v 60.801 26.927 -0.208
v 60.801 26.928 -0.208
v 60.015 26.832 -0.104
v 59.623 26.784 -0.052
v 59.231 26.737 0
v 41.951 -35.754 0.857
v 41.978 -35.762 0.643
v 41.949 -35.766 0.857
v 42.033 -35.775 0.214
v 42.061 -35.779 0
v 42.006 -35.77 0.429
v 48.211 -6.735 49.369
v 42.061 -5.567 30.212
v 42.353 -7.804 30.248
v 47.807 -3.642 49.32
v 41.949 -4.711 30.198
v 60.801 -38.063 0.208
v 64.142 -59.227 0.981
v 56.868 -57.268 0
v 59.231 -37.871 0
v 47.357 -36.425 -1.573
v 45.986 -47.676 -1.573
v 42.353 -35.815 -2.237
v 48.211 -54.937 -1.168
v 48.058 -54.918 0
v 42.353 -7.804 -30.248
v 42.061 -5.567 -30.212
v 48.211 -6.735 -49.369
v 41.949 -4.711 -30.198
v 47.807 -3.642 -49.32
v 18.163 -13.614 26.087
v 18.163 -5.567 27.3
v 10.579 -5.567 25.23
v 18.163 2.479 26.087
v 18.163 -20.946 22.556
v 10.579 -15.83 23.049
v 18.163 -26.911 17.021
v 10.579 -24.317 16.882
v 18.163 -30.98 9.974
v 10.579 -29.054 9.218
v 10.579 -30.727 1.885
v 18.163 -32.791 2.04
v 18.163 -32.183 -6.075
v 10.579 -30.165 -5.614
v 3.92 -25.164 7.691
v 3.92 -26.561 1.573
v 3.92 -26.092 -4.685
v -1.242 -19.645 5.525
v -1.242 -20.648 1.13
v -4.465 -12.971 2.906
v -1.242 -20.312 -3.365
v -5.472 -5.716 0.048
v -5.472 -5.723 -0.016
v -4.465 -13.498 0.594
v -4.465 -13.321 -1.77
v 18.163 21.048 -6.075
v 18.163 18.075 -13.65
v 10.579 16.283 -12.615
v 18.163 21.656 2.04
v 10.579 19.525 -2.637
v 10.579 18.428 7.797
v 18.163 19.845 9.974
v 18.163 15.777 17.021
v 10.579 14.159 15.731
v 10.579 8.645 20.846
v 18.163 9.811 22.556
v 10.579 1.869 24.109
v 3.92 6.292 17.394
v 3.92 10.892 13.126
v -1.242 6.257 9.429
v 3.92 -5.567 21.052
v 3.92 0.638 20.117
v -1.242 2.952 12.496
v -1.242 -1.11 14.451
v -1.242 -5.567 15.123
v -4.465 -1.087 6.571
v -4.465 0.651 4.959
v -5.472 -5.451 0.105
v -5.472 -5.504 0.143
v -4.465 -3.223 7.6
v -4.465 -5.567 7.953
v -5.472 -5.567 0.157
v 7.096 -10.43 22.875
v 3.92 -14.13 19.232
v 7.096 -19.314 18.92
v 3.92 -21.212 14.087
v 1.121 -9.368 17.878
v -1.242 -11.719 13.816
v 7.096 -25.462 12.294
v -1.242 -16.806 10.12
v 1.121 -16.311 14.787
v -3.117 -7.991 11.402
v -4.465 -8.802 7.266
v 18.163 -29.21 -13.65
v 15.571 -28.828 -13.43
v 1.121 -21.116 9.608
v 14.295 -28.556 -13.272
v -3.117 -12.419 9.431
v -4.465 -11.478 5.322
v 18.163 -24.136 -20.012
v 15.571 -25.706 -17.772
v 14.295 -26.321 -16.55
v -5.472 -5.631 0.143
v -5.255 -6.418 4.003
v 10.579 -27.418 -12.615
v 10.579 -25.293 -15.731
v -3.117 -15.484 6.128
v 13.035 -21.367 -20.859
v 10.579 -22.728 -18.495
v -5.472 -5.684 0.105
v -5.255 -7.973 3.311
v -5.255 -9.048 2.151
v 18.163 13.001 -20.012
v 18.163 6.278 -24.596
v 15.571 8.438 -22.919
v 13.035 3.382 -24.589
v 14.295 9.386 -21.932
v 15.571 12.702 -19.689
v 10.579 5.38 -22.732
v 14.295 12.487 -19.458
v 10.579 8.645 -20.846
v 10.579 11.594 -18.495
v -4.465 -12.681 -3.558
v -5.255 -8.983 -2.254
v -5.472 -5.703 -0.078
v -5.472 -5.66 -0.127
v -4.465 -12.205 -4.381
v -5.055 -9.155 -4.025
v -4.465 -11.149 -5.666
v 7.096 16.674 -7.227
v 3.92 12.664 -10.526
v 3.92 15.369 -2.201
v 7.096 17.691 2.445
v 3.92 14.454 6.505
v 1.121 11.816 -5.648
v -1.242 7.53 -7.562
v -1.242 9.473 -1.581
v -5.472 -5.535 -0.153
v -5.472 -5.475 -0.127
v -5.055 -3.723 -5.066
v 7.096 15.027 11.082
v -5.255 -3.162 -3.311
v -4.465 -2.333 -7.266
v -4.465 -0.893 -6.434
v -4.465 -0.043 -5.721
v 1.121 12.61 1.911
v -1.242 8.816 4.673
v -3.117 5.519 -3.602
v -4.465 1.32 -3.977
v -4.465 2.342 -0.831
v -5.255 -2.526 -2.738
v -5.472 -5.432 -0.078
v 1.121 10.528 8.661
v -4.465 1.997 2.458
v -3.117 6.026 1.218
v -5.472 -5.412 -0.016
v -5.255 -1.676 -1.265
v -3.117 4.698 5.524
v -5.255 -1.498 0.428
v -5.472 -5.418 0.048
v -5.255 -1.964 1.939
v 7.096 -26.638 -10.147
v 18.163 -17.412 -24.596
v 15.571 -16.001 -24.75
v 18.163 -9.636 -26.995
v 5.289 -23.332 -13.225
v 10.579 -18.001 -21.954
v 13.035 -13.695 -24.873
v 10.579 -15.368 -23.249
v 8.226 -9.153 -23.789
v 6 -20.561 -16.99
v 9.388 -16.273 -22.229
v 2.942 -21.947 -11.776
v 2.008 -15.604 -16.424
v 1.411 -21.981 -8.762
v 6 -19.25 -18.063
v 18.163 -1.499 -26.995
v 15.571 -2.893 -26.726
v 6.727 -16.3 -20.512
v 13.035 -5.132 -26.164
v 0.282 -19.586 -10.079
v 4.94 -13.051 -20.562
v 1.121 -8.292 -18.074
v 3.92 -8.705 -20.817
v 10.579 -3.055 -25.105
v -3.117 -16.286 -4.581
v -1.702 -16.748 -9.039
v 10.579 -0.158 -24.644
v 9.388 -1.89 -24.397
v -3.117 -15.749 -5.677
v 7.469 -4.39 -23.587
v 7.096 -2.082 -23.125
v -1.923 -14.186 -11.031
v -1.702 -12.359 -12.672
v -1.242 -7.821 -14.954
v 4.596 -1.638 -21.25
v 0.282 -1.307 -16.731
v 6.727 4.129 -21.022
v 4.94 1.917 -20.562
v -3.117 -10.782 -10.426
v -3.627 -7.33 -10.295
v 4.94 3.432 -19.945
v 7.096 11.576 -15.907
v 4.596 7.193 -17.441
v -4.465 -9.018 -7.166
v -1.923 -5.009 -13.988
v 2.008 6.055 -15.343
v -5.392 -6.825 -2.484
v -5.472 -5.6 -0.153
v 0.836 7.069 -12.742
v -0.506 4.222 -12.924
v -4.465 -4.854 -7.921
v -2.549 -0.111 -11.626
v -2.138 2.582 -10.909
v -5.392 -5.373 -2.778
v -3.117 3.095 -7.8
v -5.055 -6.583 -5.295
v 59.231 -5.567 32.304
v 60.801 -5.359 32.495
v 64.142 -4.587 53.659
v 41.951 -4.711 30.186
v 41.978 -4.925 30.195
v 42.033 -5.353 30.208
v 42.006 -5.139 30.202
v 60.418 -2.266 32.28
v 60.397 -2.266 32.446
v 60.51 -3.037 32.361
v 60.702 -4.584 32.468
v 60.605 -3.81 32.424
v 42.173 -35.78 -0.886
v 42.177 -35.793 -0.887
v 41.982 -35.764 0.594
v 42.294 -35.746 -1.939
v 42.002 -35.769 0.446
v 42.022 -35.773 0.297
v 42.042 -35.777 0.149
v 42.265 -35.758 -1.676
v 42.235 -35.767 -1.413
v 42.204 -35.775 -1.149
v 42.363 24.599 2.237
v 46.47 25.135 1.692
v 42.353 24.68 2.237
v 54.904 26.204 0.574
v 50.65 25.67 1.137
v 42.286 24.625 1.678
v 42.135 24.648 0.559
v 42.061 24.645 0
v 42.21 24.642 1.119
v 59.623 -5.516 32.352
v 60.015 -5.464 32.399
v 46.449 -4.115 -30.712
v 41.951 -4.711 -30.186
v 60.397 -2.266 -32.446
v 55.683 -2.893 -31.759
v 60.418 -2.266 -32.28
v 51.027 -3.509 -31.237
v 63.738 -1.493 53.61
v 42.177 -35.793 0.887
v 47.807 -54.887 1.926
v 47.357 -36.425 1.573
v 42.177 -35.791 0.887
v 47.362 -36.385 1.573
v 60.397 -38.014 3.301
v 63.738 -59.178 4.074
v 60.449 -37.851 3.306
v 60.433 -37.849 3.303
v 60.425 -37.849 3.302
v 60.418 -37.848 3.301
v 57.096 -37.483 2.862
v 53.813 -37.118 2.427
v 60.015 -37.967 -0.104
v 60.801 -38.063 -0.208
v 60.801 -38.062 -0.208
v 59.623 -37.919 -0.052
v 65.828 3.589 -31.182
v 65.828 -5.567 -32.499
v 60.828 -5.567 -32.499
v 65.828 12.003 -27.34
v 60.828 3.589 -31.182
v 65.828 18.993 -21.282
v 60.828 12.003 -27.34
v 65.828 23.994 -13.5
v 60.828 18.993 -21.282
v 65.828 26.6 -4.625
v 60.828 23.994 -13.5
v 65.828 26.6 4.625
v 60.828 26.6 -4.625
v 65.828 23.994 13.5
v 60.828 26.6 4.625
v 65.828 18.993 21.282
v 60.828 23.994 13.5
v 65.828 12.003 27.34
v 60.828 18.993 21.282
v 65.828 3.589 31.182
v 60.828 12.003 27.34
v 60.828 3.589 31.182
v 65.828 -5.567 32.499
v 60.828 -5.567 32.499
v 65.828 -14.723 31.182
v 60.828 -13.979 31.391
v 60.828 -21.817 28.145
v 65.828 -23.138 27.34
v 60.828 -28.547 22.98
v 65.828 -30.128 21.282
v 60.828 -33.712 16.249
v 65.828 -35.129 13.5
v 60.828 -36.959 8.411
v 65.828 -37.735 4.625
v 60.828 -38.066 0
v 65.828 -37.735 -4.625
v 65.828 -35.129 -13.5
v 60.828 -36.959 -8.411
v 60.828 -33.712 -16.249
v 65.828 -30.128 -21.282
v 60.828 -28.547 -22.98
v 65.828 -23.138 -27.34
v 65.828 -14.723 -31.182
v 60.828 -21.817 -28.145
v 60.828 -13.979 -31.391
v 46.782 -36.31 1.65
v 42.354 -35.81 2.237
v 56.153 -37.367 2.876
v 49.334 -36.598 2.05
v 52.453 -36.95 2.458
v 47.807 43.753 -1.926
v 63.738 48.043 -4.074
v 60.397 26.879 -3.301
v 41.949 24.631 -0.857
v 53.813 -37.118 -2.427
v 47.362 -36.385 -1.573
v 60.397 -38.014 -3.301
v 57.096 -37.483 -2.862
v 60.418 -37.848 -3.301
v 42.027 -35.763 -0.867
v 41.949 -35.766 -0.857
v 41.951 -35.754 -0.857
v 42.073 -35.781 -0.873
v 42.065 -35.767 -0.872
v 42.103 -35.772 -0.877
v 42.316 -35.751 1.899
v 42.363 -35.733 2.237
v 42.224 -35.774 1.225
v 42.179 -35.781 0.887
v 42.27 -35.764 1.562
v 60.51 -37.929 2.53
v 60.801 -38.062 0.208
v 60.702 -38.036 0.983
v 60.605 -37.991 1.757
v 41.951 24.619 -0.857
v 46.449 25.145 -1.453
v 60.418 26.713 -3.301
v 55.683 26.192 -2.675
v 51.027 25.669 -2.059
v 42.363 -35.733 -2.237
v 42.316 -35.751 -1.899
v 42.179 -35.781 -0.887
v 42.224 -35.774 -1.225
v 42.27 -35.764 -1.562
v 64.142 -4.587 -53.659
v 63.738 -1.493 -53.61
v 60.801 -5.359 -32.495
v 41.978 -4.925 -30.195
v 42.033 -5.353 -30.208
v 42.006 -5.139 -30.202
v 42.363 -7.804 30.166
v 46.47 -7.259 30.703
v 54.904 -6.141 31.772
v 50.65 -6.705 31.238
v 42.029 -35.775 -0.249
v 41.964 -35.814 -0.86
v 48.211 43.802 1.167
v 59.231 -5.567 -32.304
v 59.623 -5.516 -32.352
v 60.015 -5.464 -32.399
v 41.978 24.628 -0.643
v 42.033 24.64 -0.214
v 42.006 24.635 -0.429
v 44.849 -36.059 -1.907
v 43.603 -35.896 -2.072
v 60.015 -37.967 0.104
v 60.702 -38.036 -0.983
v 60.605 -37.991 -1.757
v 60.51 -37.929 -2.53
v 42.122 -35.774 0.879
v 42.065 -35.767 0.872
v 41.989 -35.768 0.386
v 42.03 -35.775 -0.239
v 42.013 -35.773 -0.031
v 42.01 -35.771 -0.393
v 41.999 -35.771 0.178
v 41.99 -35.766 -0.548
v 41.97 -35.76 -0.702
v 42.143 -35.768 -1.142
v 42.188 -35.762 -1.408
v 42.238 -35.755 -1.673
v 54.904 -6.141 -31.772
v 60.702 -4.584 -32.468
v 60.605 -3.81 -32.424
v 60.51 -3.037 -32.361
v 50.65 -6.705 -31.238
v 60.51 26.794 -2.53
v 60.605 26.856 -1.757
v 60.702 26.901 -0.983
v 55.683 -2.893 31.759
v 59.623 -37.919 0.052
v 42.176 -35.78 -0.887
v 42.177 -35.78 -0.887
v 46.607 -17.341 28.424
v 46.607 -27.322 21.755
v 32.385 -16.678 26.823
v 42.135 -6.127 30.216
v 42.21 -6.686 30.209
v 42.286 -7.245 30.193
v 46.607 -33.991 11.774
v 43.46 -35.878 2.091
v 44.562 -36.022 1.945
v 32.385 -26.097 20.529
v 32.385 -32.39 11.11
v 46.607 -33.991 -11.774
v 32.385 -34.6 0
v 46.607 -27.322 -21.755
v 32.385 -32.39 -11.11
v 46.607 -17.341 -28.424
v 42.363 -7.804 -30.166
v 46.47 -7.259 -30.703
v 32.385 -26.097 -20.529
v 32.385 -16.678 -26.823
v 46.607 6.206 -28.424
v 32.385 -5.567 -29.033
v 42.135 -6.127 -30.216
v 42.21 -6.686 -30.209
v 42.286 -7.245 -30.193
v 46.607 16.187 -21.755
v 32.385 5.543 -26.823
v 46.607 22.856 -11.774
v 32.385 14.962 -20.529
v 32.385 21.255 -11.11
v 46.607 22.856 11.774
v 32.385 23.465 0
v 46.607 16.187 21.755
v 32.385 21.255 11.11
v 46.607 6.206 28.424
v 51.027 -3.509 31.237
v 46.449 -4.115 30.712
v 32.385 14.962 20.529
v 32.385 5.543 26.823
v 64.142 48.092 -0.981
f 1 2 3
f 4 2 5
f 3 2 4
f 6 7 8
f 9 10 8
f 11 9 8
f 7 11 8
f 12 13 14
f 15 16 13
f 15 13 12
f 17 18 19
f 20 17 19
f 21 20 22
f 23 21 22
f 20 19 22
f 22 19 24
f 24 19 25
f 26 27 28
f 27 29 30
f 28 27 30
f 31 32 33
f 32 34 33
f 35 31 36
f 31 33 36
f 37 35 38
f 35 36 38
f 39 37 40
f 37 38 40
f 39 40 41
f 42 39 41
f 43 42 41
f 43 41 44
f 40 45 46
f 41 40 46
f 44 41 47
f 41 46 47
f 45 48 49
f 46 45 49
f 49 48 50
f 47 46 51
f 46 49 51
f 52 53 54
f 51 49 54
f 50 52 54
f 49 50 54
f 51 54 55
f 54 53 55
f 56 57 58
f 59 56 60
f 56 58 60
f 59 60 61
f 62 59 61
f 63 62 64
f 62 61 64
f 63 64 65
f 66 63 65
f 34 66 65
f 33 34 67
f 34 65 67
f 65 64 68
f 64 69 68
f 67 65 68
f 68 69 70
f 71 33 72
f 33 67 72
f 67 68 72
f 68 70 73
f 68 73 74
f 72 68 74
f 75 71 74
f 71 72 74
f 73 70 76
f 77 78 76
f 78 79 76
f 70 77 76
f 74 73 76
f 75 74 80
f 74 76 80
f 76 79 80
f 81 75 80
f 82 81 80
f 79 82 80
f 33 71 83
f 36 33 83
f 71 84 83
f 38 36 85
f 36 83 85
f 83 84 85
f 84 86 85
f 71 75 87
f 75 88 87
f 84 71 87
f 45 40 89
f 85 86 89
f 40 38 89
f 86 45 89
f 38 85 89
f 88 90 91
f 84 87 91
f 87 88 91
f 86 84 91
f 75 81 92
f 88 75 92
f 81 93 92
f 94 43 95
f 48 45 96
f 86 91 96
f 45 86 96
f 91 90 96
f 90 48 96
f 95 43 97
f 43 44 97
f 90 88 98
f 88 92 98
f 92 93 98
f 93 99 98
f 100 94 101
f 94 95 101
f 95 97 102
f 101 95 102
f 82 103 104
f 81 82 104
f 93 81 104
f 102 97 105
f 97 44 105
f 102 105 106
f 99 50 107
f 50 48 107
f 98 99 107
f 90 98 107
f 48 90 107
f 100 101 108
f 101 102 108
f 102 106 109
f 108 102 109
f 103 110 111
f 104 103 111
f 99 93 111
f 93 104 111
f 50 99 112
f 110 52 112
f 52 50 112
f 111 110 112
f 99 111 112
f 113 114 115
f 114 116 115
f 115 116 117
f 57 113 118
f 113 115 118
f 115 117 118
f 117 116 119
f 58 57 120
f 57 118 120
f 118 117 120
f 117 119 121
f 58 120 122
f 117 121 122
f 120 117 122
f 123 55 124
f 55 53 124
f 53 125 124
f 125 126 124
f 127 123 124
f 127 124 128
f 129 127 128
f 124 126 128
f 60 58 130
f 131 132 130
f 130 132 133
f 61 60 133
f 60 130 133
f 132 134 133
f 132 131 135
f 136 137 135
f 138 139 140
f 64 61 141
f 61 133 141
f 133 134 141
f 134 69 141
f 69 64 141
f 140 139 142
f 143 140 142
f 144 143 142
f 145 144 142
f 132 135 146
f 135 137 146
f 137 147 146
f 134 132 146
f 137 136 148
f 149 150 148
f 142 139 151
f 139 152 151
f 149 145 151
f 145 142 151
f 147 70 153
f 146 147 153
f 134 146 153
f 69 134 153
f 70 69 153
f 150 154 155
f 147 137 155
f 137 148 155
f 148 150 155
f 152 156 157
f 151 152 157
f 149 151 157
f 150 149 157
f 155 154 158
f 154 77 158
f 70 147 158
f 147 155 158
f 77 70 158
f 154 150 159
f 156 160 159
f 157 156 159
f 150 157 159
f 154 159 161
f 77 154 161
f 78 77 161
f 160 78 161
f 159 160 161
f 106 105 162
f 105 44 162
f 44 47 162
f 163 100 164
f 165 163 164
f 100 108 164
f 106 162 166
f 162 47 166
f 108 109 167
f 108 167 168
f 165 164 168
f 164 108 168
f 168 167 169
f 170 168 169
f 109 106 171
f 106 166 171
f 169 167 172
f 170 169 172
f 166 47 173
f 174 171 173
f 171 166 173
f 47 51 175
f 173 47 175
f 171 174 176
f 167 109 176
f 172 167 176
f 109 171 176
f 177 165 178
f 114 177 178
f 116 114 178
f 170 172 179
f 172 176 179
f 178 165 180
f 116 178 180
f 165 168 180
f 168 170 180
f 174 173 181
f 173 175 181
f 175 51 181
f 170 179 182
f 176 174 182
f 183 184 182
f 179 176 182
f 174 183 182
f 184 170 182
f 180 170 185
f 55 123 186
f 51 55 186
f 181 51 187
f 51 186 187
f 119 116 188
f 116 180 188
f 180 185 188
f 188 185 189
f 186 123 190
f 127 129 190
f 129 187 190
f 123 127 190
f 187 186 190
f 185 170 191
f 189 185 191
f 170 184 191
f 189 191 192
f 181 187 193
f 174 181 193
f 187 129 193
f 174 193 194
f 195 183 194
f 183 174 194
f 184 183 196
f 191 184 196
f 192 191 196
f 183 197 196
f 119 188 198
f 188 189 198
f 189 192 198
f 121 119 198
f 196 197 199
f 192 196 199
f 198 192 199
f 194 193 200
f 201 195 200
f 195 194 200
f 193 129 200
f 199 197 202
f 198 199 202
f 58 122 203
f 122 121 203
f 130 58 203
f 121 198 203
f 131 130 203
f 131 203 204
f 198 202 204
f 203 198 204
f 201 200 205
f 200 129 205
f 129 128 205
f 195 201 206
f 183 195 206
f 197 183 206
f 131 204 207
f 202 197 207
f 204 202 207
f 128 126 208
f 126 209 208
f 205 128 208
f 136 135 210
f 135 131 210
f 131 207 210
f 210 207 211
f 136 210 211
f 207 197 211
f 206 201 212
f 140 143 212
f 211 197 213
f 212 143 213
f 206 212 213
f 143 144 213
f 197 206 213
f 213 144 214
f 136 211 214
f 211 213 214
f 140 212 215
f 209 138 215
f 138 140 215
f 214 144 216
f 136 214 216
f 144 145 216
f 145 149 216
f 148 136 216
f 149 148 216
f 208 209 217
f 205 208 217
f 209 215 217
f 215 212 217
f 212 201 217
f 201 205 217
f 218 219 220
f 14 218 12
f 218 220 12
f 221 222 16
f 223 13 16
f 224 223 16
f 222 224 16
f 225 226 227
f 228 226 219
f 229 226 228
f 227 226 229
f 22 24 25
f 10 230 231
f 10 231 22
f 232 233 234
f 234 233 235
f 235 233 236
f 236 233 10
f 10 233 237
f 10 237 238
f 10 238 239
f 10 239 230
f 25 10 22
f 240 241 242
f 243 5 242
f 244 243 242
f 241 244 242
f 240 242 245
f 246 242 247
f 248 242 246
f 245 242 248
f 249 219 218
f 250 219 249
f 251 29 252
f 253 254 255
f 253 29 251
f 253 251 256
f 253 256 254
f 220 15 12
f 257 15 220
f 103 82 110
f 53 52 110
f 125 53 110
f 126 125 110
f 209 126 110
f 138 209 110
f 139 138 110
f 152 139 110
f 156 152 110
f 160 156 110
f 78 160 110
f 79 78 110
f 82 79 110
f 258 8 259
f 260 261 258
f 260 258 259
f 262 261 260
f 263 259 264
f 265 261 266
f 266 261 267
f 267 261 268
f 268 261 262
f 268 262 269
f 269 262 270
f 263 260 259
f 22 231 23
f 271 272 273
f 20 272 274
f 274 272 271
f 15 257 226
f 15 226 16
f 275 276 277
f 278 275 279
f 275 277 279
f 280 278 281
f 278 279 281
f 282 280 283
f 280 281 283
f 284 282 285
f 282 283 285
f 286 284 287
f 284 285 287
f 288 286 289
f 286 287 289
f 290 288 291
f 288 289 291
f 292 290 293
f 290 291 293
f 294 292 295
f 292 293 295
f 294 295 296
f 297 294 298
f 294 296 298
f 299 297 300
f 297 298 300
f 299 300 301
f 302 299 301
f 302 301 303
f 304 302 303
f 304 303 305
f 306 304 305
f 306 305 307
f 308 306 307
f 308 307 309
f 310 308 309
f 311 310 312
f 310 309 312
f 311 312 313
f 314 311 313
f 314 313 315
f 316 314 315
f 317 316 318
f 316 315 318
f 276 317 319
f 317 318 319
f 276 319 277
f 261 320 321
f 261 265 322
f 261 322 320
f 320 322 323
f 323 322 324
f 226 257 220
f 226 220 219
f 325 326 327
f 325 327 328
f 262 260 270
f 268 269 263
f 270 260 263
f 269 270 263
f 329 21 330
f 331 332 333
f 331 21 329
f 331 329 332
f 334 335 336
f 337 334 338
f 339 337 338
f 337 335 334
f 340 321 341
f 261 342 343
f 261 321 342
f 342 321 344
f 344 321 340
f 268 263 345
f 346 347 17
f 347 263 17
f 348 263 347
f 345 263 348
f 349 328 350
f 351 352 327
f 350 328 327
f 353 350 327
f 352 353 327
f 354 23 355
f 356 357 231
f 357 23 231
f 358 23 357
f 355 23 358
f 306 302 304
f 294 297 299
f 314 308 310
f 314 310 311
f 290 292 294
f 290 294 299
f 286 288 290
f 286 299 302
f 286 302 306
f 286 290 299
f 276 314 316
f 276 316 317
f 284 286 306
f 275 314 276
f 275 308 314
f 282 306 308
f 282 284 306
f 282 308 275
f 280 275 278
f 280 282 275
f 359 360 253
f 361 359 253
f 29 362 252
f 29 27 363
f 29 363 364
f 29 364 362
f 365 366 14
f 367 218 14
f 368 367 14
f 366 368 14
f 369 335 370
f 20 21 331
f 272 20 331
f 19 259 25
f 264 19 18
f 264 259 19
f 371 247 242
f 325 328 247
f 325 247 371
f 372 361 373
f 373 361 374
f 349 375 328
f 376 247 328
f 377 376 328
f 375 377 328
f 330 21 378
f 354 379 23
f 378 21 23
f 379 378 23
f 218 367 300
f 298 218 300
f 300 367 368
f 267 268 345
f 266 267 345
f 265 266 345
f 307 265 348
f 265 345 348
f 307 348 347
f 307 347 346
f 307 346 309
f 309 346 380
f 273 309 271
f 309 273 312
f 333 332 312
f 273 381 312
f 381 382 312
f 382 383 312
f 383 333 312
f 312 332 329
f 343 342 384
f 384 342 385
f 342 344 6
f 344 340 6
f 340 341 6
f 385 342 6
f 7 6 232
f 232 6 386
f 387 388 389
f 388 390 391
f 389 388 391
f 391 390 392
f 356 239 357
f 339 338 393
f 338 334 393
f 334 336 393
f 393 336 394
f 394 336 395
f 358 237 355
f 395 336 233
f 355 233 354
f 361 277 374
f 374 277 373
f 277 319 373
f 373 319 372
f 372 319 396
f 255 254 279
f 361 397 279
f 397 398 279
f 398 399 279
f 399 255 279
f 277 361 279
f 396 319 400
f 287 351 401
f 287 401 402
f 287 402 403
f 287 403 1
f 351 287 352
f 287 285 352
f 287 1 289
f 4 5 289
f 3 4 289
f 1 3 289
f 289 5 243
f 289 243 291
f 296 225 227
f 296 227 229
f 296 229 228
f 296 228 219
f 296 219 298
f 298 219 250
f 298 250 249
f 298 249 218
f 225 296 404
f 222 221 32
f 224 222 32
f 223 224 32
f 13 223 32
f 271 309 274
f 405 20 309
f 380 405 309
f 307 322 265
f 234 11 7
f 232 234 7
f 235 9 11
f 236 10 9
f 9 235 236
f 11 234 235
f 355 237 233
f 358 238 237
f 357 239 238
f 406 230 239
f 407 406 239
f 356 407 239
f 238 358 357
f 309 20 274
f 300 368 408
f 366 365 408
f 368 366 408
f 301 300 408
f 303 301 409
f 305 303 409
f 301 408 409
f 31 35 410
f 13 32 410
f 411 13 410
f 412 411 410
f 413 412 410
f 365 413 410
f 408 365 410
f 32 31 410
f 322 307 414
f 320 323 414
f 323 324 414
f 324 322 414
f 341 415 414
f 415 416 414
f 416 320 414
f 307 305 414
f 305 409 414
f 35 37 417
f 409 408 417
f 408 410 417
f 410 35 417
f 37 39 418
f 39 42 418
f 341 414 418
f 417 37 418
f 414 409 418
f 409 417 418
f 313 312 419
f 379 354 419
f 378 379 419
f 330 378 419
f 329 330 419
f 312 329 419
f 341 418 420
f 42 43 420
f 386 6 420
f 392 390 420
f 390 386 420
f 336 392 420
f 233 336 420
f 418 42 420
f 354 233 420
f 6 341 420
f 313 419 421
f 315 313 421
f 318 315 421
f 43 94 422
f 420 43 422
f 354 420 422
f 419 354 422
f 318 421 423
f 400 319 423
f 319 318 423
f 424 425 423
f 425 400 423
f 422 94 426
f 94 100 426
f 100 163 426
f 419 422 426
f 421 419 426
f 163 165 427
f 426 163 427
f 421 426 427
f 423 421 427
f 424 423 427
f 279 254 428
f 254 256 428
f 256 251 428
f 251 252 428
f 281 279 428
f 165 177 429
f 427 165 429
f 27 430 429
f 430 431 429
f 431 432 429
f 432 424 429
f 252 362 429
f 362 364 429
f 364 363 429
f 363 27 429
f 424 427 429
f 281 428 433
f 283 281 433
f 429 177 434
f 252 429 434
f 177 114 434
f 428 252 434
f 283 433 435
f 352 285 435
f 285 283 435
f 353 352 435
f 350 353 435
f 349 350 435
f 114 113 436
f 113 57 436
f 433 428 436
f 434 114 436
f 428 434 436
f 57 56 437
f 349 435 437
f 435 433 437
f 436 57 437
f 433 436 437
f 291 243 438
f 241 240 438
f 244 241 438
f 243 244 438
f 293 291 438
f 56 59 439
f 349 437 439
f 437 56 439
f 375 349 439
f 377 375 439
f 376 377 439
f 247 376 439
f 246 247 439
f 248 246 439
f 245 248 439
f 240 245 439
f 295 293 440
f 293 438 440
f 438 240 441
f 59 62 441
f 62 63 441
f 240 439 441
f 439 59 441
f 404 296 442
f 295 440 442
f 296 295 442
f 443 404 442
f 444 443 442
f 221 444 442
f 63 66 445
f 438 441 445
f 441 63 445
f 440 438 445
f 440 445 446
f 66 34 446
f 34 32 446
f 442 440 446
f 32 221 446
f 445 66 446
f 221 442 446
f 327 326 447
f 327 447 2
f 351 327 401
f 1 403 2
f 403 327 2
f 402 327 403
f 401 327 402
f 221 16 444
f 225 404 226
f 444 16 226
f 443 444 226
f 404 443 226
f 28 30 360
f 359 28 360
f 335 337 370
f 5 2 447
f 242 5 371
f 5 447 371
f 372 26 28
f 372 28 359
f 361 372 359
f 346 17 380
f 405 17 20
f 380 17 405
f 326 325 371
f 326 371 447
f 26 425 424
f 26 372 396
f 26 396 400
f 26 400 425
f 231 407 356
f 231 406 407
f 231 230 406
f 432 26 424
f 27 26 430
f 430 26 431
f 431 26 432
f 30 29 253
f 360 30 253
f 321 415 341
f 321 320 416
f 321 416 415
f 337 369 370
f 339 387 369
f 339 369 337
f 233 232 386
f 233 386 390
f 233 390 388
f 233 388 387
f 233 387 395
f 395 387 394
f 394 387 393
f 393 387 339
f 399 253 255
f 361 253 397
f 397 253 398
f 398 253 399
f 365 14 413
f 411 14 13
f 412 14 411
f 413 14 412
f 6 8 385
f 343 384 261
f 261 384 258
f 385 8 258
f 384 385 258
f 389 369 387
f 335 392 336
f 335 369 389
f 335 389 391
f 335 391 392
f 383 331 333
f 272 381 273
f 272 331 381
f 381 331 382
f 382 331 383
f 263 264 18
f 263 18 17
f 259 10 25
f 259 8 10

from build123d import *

# Parameters (mm, degrees)
BOSS_EXTRUDE1_DEPTH  = 4
BOSS_EXTRUDE5_DEPTH  = 0.5
CIRPATTERN27_COUNT   = 2
CIRPATTERN28_COUNT   = 2
CIRPATTERN28_ANGLE   = 270
MIRROR5_COPY_1_DEPTH = 4
MIRROR5_COPY_2_DEPTH = 0.5
CUT_EXTRUDE1_DEPTH   = 7.5
CUT_EXTRUDE5_DEPTH   = 7.5
CUT_EXTRUDE8_DEPTH   = 7.5
CUT_EXTRUDE9_DEPTH   = 7.5
SCALE1_SCALE         = 0.78
SKETCH35_R           = 32.4987
BOSS_EXTRUDE6_DEPTH  = 5


with BuildPart() as part:
    # Sketch1 → Revolve1 (revolve)
    with BuildSketch(Plane.XY, mode=Mode.PRIVATE) as revolve1_sk:
        with BuildLine():
            Line((68.355271076, -5.571052632), (68.355271076, 36.093947368))
            Line((68.355271076, 36.093947368), (13.656115926, 29.428947368))
            ThreePointArc((13.656115926, 29.428947368), (-8.192658078, 17.861941693), (-16.644728924, -5.370084567))
            Line((-16.644728924, -5.370084567), (-16.644728924, -5.571052632))
            Line((-16.644728924, -5.571052632), (68.355271076, -5.571052632))
        make_face()
    revolve(revolve1_sk.sketch.rotate(Axis((-16.644728924, -5.571052632, 0), (1, 0, 0)), 90), axis=Axis((-16.644728924, -5.571052632, 0), (1, 0, 0)))



with BuildPart() as body_2:
    # Sketch3 → Boss-Extrude1 (new body)
    with BuildSketch(Plane(origin=(0.689359663, -0.083997315, -5.279598975), x_dir=(0.984180627017453, -0.11992075309071235, 0.13041283058690828), z_dir=(0.12945535873547723, -0.01577391759705046, -0.9914597791228399))):
        Polygon((48.907006258, 38.621427836), (59.41626027, 62.048150042), (80.536298945, 65.037658628), (72.938516553, 38.621427836), align=None)
    boss_extrude1 = extrude(amount=BOSS_EXTRUDE1_DEPTH)


with BuildPart() as part_1:
    add(part.part)

    add(body_2.part)  # Boss-Extrude5 merges body 2
    # Sketch12 → Boss-Extrude5 (add)
    with BuildSketch(Plane(origin=(-4.671405547, -38.337874984, 0), x_dir=(0.9926581468470392, -0.12095372461483828, 0), z_dir=(0.12095372461483828, 0.9926581468470392, 0))):
        Polygon((49.183787896, -1.098502146), (73.010063784, -4.232519427), (73.531715107, -0.266680311), (49.705439218, 2.86733697), align=None)
    boss_extrude5 = extrude(amount=BOSS_EXTRUDE5_DEPTH)

    # CirPattern27: Boss-Extrude1, Boss-Extrude5 ×2 about axis
    cirpattern27_axis = Axis((0, -5.571052632, 0), (1, 0, 0))
    add([boss_extrude1.rotate(cirpattern27_axis, i * 360 / CIRPATTERN27_COUNT) for i in range(1, CIRPATTERN27_COUNT)])
    add([boss_extrude5.rotate(cirpattern27_axis, i * 360 / CIRPATTERN27_COUNT) for i in range(1, CIRPATTERN27_COUNT)])

    # CirPattern28: Boss-Extrude1, Boss-Extrude5 ×2 about axis
    cirpattern28_axis = Axis((0, -5.571052632, 0), (1, 0, 0))
    add([boss_extrude1.rotate(cirpattern28_axis, i * CIRPATTERN28_ANGLE / (CIRPATTERN28_COUNT - 1)) for i in range(1, CIRPATTERN28_COUNT)])
    add([boss_extrude5.rotate(cirpattern28_axis, i * CIRPATTERN28_ANGLE / (CIRPATTERN28_COUNT - 1)) for i in range(1, CIRPATTERN28_COUNT)])

    # Mirror5: Boss-Extrude1, Boss-Extrude5 across plane
    add(boss_extrude1.mirror(Plane.XY))
    add(boss_extrude5.mirror(Plane.XY))

    # Mirror5 copy 1 sketch → Mirror5 copy 1 (add)
    with BuildSketch(Plane(origin=(0.689359663, -10.850651607, 5.487055317), x_dir=(0.984180627017453, 0.13041283058690448, -0.1199207530907165), z_dir=(0.12945535873547723, -0.9914597791228404, -0.01577391759701894))):
        Polygon((48.907006258, -38.621427836), (59.41626027, -62.048150042), (80.536298945, -65.037658628), (72.938516553, -38.621427836), align=None)
    extrude(amount=MIRROR5_COPY_1_DEPTH)

    # Mirror5 copy 2 sketch → Mirror5 copy 2 (add)
    with BuildSketch(Plane(origin=(-4.671405547, -5.571052632, -32.766822353), x_dir=(0.9926581468470392, -3.849360784322416e-15, -0.12095372461483828), z_dir=(0.12095372461483828, 3.155393511496951e-14, 0.9926581468470392))):
        Polygon((49.183787896, 1.098502146), (73.010063784, 4.232519427), (73.531715107, 0.266680311), (49.705439218, -2.86733697), align=None)
    extrude(amount=MIRROR5_COPY_2_DEPTH)

    # Sketch19 → Cut-Extrude1 (cut)
    with BuildSketch(Plane(origin=(1.207181098, -0.147092985, -9.245438092), x_dir=(-0.9915852481222116, -0.002136148499024363, -0.1294377556047779), z_dir=(0.12945535873547703, -0.01577391759705043, -0.99145977912284))):
        Polygon((-67.679175208, -47.235274194), (-71.995880368, -74.381353157), (-48.207029253, -72.13480707), (-43.827344507, -44.302074699), align=None)
    extrude(amount=CUT_EXTRUDE1_DEPTH, mode=Mode.SUBTRACT)

    # Sketch25 → Cut-Extrude5 (cut)
    with BuildSketch(Plane(origin=(0.689359663, -0.083997315, -5.279598975), x_dir=(0.9915852481222117, 0.0021361484990243696, 0.12943775560477816), z_dir=(-0.12945535873547726, 0.015773917597050467, 0.9914597791228399))):
        Polygon((50.891173425, -68.699745189), (71.995880368, -74.381353157), (67.745856954, -47.027055514), (43.827344507, -44.302074699), align=None)
    extrude(amount=CUT_EXTRUDE5_DEPTH, mode=Mode.SUBTRACT)

    # Sketch27 → Cut-Extrude8 (cut)
    with BuildSketch(Plane(origin=(27.301219353, 8.554612251, 3.42863066), x_dir=(-0.1138420069613441, -0.034629872676622354, 0.9928951452038701), z_dir=(-0.9474716659737562, -0.29688244383743123, -0.11898847304688671))):
        Polygon((-1.047061464, -81.100132743), (-2.40192559, -55.459928446), (-6.401425806, -55.574995755), (-5.041488706, -81.311203845), (-3.533903508, -81.231540942), align=None)
    extrude(amount=CUT_EXTRUDE8_DEPTH, mode=Mode.SUBTRACT)

    # Sketch28 → Cut-Extrude9 (cut)
    with BuildSketch(Plane(origin=(-13.685744002, -51.305630722, -0.970692032), x_dir=(-0.9662265281220836, 0.25764897067882825, 0.00482744873453606), z_dir=(-0.25769418750233414, -0.9660536410379842, -0.018277537163565623))):
        Polygon((-89.283438439, -2.656910088), (-88.769166907, -6.623772053), (-66.015638627, -3.548604791), (-66.551372854, 0.415356464), align=None)
    extrude(amount=CUT_EXTRUDE9_DEPTH, mode=Mode.SUBTRACT)


with BuildPart() as part_2:
    # Scale1: scaled about (34.142034643, -5.554496793, -1.7178e-05)
    add(part_1.part.scale(SCALE1_SCALE).moved(Location((7.511247621, -1.221989294, -3.779e-06))))

    # Sketch35 → Boss-Extrude6 (add)
    with BuildSketch(Plane(origin=(60.828359062, 0, 0), x_dir=(0, 0, -1), z_dir=(1, 0, 0))):
        with Locations((3.778e-06, -5.567410349)):
            Circle(SKETCH35_R)
    extrude(amount=BOSS_EXTRUDE6_DEPTH)


solid = part_2.part
